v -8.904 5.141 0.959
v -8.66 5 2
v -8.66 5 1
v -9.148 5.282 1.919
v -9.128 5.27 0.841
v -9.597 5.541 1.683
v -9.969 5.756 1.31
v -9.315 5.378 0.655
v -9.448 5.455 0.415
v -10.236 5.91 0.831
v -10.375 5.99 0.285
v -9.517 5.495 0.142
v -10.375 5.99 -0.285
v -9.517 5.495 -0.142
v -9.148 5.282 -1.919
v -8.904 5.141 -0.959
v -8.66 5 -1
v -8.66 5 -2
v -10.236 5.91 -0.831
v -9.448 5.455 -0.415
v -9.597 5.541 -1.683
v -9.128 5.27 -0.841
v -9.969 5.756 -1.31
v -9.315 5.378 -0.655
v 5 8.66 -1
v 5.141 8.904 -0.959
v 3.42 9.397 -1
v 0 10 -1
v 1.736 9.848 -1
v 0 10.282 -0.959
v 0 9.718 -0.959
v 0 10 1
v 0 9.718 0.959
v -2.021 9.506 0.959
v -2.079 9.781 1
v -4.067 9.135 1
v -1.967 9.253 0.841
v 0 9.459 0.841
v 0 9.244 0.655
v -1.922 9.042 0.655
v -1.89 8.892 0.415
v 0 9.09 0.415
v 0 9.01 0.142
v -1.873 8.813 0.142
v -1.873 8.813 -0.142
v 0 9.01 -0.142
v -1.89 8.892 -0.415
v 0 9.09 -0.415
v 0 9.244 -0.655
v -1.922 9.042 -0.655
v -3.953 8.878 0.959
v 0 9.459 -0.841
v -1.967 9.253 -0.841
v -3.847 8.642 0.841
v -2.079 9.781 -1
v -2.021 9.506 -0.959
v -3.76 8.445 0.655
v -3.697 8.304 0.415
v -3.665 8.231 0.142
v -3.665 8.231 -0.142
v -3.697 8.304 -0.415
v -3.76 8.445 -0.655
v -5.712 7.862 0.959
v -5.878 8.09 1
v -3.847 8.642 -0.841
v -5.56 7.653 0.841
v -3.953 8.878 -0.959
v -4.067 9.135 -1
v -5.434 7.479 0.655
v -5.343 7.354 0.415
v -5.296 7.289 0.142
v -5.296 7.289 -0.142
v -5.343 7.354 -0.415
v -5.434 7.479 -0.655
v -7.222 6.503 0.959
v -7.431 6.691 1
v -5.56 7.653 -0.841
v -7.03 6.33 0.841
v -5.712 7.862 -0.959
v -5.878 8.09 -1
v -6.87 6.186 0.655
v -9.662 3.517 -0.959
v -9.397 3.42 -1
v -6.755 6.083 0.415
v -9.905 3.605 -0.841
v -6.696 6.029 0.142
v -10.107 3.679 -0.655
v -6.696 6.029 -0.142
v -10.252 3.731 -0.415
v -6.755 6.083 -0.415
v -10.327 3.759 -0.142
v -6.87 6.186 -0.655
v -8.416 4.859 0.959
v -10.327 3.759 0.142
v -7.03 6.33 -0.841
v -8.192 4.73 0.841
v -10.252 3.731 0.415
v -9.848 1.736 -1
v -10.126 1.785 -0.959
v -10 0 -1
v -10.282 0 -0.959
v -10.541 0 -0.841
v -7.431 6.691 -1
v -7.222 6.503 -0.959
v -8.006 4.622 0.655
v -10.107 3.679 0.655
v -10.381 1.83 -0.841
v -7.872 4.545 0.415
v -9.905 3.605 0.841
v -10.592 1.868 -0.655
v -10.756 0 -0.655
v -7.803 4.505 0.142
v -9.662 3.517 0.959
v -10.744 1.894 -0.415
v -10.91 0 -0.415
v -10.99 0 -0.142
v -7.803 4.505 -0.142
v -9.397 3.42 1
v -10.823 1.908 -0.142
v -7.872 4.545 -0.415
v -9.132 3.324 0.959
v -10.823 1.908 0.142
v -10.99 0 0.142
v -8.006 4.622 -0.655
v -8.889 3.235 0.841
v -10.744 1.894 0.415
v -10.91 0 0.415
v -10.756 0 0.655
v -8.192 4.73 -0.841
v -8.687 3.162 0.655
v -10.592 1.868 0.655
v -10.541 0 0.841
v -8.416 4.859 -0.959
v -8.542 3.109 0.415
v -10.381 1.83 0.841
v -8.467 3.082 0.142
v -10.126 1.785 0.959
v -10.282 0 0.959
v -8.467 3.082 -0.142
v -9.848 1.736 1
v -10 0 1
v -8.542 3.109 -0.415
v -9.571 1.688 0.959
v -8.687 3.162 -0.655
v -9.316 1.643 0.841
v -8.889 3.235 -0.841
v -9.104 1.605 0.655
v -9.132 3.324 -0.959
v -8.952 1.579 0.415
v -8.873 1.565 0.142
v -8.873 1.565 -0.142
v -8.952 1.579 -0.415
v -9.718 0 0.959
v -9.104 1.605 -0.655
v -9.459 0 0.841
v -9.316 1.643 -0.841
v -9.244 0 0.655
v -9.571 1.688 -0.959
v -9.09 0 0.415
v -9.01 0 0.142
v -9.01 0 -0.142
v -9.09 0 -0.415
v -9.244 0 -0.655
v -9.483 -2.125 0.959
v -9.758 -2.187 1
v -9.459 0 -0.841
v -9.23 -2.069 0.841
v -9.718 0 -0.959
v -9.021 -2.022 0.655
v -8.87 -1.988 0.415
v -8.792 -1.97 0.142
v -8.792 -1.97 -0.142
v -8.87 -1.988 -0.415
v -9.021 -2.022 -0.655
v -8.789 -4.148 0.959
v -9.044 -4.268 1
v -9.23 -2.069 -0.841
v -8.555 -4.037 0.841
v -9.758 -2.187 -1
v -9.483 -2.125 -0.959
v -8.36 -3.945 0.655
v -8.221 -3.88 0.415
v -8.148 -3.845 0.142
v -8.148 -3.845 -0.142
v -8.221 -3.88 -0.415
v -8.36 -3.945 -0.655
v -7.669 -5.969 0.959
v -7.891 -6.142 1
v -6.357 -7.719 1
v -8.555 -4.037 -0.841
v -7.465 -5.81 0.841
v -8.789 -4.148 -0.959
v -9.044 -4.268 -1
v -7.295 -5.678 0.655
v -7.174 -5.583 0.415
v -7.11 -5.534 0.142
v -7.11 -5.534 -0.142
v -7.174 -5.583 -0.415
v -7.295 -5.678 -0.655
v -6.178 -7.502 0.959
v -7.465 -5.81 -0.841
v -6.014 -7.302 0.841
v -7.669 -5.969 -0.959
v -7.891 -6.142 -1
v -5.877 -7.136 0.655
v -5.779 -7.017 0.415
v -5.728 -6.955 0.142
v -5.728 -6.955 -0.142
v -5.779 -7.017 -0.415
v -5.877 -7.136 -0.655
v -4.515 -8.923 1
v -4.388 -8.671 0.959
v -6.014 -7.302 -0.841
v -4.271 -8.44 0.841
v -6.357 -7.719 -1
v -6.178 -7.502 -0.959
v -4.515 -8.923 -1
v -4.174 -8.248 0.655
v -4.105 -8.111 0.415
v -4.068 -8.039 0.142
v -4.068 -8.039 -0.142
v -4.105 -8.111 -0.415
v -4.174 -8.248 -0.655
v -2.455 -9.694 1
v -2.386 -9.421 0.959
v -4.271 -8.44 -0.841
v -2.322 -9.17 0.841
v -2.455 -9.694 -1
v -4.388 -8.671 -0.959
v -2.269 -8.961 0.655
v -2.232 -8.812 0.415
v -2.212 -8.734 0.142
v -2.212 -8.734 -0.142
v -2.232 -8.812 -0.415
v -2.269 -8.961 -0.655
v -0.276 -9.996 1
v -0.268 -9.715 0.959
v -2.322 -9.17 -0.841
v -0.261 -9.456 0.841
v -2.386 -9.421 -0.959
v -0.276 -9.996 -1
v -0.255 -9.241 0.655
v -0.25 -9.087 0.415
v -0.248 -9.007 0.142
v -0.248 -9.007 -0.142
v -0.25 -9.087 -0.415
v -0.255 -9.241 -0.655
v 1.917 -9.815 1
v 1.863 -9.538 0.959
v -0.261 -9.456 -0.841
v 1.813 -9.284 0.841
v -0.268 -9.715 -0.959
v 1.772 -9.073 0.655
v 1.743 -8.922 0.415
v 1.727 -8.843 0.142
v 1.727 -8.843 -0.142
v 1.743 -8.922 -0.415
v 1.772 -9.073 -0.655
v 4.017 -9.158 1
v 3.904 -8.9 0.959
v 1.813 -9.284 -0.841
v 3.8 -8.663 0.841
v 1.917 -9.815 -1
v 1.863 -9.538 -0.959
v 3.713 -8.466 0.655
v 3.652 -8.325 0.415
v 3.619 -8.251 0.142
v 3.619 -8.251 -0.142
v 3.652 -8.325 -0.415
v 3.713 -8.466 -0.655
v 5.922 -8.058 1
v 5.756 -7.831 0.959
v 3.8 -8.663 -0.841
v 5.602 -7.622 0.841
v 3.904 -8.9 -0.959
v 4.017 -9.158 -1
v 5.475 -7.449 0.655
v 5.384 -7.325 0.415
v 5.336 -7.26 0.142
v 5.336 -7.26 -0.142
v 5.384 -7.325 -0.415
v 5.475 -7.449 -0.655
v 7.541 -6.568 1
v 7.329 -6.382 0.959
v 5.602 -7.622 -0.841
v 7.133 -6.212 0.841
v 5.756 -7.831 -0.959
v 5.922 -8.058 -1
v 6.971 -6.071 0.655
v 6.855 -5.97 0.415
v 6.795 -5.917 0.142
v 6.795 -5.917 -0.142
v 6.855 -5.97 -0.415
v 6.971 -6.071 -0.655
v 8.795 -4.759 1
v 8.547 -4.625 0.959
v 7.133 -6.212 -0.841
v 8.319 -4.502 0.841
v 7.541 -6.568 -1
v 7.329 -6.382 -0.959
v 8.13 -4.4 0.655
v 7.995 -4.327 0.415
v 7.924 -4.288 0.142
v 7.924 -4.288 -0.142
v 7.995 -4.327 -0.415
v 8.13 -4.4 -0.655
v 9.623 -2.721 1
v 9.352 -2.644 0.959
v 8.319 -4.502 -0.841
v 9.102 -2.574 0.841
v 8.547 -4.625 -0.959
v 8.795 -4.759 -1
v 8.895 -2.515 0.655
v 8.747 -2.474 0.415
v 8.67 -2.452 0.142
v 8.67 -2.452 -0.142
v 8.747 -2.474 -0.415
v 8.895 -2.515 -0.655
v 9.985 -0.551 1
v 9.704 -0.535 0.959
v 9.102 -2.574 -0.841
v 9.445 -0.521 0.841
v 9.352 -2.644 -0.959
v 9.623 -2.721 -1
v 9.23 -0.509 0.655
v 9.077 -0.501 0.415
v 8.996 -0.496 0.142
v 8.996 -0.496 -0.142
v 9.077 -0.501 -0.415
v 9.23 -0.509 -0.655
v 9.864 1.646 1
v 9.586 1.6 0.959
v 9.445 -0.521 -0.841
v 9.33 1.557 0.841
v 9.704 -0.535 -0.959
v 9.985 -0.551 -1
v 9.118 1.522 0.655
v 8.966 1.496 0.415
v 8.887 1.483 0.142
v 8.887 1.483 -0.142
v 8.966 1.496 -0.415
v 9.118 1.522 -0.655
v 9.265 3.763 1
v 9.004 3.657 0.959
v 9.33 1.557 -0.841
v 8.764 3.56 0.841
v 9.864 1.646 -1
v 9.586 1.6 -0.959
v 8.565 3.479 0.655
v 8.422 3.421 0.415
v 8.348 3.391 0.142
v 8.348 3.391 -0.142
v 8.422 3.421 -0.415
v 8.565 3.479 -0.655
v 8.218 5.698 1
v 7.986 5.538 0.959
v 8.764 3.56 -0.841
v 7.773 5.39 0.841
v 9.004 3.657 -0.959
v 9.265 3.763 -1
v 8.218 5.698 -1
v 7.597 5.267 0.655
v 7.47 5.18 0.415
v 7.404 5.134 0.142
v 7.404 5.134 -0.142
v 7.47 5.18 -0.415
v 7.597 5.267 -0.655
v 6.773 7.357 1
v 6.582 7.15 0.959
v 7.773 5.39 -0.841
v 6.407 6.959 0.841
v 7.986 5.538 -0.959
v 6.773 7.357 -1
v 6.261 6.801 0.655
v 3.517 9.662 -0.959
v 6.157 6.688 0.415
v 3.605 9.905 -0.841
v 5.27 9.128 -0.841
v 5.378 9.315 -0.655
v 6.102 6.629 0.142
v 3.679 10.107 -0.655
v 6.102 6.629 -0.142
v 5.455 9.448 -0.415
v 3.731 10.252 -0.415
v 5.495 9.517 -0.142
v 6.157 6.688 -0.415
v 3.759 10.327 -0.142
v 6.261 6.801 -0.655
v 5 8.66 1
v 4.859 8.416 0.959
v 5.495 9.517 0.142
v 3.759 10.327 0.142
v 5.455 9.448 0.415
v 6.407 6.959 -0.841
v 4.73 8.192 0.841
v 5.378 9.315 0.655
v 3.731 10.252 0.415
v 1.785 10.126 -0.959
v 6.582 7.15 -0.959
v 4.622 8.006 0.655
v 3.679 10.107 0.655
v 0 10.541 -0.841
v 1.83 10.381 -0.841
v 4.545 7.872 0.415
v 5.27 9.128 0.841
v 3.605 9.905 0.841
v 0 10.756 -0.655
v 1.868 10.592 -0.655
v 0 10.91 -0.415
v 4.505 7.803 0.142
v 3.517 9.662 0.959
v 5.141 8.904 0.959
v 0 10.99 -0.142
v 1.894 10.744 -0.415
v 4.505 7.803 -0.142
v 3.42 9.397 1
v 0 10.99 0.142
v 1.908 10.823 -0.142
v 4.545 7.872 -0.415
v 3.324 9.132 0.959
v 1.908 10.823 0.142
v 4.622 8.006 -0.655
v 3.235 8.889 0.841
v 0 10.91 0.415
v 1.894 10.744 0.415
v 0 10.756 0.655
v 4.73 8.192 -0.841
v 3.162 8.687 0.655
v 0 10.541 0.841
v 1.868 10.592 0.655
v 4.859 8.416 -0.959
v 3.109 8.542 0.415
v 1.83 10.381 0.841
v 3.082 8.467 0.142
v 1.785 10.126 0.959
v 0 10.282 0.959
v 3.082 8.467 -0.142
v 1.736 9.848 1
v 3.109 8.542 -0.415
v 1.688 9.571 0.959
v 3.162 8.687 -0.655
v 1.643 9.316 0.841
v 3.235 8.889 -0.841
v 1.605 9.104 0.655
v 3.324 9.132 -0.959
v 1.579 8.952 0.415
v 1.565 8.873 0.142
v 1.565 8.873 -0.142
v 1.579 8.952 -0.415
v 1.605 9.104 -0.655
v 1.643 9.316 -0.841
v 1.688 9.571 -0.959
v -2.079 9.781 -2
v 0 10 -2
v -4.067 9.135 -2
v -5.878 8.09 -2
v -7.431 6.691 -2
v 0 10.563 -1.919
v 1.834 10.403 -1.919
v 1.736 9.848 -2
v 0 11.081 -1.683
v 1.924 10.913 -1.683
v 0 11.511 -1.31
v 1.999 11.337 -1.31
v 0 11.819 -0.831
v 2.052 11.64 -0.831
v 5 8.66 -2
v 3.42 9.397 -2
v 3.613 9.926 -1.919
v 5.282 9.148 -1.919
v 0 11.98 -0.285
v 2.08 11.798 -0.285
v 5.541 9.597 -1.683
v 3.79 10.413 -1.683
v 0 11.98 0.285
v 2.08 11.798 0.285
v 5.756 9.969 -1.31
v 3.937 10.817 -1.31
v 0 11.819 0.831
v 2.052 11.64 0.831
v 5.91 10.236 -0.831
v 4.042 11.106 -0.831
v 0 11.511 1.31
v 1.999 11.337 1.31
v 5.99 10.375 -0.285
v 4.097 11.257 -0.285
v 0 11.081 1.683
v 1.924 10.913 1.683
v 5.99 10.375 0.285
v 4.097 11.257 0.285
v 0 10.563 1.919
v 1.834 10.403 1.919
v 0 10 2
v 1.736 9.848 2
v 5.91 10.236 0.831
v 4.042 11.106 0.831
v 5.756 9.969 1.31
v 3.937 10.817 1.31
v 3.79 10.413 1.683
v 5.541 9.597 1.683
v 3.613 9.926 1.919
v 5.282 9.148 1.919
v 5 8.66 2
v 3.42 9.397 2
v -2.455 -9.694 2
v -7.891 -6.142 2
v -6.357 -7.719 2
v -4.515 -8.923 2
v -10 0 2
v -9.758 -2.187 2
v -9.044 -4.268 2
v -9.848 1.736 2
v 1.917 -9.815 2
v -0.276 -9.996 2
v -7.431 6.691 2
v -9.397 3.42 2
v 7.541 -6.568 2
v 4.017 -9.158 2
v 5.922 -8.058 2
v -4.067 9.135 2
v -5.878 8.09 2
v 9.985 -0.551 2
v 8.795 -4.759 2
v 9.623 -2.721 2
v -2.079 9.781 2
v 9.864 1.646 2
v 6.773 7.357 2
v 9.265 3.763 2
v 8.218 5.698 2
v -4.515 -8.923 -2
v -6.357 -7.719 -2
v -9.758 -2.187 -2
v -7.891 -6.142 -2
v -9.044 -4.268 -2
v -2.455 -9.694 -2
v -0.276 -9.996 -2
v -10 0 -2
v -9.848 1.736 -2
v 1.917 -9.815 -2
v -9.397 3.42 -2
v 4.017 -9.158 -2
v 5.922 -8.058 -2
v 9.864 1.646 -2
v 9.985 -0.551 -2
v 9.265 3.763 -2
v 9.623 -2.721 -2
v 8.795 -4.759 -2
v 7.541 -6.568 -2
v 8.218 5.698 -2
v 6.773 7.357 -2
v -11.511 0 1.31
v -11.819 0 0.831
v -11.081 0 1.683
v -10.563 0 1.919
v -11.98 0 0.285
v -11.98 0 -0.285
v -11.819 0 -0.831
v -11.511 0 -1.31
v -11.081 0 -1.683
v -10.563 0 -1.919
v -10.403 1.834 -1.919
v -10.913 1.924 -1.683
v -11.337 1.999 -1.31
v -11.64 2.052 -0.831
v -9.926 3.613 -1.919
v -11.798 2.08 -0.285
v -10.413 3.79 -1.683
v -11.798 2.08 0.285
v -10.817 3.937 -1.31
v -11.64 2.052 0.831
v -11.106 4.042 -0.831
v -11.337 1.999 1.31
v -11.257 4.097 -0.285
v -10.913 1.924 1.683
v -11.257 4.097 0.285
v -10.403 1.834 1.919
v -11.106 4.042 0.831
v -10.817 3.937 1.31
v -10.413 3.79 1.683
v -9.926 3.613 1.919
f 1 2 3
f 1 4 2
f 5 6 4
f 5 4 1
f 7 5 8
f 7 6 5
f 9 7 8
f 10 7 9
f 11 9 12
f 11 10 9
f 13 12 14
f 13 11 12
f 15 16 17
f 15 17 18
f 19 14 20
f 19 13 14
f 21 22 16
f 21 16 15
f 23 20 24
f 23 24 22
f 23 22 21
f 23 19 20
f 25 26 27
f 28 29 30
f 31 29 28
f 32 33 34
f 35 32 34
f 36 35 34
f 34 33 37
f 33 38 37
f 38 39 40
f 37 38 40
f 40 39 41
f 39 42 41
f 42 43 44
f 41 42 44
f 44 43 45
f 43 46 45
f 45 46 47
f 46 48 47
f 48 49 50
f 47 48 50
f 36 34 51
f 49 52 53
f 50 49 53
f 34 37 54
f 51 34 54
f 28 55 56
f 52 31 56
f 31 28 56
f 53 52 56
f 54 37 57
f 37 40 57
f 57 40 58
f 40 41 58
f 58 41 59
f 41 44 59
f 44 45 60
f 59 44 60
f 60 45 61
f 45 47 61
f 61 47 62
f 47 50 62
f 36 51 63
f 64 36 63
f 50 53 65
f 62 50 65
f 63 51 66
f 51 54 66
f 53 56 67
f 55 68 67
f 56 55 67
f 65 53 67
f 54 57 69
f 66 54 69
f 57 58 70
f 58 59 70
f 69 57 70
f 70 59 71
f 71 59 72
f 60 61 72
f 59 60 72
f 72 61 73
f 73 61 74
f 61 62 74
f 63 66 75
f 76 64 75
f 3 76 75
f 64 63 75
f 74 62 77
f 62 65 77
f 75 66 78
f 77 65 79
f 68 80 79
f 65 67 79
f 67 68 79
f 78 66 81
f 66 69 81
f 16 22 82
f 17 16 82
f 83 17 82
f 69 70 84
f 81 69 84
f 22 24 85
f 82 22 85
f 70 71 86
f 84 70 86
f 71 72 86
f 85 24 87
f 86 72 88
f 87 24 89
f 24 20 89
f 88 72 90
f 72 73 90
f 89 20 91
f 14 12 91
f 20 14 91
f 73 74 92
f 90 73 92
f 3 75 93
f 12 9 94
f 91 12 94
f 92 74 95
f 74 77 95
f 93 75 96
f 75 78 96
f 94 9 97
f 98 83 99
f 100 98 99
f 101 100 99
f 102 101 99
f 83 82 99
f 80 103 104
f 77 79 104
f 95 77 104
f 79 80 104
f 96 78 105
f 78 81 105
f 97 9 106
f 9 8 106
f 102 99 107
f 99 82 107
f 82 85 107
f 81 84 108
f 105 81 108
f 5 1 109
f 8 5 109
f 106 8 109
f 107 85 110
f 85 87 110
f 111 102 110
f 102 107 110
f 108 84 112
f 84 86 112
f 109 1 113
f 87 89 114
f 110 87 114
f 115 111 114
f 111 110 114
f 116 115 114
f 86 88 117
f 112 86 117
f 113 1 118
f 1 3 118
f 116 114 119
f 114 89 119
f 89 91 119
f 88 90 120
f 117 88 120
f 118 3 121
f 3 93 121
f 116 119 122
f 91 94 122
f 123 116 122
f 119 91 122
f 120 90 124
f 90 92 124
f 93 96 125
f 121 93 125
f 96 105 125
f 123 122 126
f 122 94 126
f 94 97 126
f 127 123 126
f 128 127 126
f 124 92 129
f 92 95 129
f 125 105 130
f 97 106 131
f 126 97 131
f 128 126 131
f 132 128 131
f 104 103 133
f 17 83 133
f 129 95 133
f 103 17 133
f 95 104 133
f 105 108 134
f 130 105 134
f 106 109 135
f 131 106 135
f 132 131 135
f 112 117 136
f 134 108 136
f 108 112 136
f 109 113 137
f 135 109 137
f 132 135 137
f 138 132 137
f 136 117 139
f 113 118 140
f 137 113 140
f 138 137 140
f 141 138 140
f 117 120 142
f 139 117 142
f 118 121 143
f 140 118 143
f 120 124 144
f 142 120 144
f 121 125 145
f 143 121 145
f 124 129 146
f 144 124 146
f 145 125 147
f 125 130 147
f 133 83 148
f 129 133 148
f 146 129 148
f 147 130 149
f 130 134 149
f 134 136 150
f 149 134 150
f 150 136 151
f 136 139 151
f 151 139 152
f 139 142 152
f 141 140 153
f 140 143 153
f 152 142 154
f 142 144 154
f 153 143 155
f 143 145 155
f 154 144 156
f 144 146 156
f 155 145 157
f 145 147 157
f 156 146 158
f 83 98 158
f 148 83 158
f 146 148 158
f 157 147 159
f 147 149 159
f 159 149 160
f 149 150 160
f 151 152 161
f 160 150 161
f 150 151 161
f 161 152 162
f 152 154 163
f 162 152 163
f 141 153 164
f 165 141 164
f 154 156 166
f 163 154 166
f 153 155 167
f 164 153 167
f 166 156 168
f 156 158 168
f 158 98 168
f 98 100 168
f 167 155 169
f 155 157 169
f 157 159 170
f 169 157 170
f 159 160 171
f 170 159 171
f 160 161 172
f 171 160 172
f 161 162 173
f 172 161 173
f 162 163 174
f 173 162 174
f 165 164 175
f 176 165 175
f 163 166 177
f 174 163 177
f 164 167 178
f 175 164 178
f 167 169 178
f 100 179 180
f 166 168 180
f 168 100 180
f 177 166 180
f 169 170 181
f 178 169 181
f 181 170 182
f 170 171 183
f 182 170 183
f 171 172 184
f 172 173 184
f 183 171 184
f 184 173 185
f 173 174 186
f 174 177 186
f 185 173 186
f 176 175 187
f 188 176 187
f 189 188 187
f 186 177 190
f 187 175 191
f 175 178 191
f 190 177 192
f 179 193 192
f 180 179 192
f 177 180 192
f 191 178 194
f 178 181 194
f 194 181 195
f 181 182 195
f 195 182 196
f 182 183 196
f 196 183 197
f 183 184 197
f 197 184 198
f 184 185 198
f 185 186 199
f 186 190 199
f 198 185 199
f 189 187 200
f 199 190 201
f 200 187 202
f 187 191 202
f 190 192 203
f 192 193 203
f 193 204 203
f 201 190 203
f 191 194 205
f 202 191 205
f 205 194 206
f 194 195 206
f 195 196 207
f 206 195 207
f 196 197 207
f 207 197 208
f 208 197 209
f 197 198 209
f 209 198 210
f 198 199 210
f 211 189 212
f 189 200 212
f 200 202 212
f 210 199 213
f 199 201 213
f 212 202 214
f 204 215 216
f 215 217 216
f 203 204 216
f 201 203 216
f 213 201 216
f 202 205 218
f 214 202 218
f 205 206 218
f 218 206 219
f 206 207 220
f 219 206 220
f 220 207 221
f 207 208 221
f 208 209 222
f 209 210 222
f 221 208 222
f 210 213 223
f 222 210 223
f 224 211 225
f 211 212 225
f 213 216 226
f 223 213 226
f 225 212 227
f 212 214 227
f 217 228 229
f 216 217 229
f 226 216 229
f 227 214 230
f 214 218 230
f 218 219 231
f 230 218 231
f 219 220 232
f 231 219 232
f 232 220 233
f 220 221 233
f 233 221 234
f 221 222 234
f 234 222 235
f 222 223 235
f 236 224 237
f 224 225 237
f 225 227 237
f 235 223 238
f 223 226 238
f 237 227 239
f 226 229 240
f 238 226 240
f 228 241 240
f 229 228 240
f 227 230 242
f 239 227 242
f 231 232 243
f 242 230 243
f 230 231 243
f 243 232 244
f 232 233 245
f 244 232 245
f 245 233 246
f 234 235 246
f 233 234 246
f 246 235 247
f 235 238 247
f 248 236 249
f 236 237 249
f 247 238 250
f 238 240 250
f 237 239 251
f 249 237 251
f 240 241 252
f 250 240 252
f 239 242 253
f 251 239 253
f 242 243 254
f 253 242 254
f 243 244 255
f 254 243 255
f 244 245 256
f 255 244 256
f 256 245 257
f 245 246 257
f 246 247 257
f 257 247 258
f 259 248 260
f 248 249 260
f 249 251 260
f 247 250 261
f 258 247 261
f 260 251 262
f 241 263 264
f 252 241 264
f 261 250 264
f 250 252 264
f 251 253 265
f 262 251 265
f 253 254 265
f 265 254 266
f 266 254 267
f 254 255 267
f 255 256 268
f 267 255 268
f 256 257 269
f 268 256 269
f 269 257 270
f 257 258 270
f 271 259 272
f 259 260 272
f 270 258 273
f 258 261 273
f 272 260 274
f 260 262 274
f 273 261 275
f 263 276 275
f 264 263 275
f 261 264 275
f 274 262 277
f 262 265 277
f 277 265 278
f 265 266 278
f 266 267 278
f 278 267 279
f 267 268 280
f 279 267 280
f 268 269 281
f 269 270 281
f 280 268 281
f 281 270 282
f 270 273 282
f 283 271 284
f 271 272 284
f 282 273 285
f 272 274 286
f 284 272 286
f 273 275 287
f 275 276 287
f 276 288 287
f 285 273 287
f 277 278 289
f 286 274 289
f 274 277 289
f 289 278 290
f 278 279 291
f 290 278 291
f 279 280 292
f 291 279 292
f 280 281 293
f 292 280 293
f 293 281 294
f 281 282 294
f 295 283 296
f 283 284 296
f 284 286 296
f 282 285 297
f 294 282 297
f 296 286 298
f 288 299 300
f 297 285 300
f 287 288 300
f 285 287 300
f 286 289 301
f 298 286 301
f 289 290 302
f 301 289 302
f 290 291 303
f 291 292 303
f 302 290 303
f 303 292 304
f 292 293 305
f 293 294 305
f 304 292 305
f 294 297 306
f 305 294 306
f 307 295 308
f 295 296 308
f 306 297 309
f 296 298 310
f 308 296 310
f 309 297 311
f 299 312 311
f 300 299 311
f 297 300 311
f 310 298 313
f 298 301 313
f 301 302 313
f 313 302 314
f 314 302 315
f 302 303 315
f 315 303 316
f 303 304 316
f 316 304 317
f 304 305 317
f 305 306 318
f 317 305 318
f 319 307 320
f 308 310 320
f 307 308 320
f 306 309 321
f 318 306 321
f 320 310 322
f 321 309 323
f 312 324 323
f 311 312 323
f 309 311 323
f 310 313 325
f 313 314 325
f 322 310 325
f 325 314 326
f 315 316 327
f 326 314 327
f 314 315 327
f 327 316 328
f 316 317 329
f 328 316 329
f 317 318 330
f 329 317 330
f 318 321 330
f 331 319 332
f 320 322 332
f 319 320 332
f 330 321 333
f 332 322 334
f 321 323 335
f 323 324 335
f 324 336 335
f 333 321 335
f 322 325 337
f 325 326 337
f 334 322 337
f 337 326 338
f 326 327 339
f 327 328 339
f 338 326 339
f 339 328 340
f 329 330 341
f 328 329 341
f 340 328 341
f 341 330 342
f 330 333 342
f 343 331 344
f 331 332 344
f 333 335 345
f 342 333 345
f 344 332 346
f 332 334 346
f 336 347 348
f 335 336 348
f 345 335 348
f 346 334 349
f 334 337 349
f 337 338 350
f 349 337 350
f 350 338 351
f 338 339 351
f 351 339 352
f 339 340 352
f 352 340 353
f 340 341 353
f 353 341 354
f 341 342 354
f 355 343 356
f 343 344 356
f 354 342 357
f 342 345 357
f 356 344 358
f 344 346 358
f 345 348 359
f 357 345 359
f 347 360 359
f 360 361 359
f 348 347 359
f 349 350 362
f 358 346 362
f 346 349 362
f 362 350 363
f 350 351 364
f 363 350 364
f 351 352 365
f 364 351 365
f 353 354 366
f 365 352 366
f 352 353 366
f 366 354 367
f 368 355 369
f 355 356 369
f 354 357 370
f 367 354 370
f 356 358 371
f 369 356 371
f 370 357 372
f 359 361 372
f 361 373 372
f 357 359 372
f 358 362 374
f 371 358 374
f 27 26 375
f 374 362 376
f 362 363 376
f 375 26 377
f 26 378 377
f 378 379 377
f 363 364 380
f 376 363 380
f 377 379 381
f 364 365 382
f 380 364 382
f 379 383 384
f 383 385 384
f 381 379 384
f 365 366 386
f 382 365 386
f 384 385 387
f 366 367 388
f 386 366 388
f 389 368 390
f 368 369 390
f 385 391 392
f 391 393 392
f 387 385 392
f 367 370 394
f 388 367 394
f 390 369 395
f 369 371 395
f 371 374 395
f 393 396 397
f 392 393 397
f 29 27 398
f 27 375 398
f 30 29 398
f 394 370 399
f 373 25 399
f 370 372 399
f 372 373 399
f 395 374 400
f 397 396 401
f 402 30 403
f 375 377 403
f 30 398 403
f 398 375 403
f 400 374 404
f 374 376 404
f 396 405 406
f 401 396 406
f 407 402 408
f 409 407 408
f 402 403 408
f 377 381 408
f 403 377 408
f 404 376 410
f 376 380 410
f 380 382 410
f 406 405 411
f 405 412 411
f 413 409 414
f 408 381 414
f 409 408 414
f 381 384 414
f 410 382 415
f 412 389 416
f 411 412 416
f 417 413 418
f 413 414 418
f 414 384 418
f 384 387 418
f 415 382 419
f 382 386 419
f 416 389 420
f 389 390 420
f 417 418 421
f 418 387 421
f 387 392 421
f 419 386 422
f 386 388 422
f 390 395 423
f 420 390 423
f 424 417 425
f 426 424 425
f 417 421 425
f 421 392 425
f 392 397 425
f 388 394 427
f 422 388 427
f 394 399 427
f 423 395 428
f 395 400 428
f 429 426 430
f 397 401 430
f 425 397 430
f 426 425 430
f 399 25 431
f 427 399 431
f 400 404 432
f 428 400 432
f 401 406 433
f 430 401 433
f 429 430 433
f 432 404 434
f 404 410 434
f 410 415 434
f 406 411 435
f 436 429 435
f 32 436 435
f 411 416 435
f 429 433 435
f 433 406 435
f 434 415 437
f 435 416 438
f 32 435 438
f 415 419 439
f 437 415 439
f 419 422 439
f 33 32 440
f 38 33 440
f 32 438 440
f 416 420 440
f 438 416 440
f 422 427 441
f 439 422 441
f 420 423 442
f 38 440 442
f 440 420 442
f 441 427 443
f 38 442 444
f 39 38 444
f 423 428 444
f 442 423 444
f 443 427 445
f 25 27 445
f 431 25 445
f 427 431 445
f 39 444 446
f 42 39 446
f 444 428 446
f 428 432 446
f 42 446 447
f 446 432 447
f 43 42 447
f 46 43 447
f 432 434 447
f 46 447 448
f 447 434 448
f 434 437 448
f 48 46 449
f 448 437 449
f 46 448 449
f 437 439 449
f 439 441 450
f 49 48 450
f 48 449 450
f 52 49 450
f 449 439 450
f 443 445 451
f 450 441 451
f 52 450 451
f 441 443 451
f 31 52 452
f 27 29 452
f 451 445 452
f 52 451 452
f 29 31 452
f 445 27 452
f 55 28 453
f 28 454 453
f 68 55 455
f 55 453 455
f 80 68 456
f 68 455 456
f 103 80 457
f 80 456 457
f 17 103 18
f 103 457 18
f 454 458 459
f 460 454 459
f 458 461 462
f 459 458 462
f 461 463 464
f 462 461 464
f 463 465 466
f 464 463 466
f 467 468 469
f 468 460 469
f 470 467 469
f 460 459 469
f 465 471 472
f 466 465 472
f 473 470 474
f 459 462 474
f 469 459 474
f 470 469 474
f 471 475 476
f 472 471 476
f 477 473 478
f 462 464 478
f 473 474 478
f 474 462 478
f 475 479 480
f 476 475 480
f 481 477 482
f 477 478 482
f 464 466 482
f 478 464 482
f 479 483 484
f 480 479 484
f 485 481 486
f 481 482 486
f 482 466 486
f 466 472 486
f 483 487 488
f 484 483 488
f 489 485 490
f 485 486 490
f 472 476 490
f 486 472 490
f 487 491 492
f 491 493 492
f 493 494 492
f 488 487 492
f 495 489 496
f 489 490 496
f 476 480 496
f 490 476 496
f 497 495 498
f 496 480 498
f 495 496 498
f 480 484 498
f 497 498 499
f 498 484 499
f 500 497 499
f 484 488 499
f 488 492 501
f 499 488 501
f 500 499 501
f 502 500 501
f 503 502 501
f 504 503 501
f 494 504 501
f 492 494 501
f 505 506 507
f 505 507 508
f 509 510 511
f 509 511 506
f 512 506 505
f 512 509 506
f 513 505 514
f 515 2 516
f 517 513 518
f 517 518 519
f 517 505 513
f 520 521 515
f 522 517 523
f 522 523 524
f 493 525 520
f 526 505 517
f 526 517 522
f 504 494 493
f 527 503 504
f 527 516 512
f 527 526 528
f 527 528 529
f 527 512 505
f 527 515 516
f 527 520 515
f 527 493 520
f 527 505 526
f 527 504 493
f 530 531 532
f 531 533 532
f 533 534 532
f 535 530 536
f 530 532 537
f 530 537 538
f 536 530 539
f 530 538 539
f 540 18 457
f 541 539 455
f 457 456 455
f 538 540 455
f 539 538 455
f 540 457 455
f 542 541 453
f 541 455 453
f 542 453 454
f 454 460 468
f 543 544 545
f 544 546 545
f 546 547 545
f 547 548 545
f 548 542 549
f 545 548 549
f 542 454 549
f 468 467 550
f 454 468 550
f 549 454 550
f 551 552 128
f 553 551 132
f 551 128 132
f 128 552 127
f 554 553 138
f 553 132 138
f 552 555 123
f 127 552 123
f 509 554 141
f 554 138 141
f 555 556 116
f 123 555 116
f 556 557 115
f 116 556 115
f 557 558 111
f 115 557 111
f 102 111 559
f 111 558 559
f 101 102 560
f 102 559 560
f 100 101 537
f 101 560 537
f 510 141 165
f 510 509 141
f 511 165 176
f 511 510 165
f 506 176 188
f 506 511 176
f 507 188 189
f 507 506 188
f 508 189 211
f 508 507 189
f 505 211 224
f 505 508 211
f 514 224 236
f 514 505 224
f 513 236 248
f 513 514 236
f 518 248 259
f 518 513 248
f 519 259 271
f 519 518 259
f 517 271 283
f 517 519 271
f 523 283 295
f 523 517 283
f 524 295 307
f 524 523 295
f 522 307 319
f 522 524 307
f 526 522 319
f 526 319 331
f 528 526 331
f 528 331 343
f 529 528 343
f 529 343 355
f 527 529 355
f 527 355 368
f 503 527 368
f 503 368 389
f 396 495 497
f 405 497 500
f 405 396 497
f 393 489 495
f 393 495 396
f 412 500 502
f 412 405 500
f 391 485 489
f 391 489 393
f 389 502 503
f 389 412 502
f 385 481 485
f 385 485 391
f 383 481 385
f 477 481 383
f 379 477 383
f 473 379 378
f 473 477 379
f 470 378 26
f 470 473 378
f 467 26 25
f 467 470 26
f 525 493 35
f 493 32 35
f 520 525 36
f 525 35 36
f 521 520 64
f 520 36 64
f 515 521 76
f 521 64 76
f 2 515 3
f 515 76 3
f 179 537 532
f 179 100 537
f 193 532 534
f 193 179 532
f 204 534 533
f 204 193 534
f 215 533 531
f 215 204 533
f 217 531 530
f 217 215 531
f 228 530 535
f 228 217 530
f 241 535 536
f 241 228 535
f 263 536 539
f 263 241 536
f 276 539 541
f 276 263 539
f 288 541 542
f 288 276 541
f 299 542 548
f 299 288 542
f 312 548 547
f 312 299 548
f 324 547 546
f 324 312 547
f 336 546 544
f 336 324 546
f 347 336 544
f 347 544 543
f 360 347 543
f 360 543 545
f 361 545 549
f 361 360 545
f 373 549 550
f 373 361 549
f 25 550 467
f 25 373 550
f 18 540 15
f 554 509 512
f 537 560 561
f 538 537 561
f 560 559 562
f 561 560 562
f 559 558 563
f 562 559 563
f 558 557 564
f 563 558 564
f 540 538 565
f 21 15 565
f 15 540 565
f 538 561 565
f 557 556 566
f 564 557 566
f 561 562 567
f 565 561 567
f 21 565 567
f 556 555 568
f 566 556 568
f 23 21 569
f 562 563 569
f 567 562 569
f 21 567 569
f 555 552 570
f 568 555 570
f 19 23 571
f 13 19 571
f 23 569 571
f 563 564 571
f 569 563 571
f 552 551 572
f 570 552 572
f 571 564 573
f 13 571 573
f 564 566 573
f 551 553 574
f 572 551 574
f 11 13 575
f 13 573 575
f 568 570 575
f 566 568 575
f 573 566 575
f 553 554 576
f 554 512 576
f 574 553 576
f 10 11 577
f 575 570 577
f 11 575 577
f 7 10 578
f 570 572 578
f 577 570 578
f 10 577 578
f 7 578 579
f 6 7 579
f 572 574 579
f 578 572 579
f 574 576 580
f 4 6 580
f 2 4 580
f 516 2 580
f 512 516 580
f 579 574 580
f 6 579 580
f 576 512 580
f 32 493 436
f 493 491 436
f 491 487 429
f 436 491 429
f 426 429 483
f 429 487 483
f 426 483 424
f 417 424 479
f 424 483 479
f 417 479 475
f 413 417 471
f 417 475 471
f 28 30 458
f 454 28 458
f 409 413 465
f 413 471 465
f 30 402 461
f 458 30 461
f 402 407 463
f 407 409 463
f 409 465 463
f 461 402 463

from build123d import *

# Parameters (mm, degrees)
ESQUISSE1_R                             = 10
BOSS_EXTRU_1_DEPTH                      = 2
ESQUISSE4_R                             = 2
R_VOLUTION1_ANGLE                       = 120
ESQUISSE2_R                             = 1
ENL_VEMENT_DE_MATI_RE_R_VOLUTION2_ANGLE = 60


with BuildPart() as part:
    # Esquisse1 → Boss.-Extru.1 (new body, symmetric)
    with BuildSketch(Plane.XY):
        Circle(ESQUISSE1_R)
    extrude(amount=BOSS_EXTRU_1_DEPTH, both=True)

    # Esquisse4 → Révolution1 (revolve)
    with BuildSketch(Plane(origin=(0, 0, 0), x_dir=(1, 0, 0), z_dir=(0, 1, 0))):
        with Locations((-10, 0)):
            Circle(ESQUISSE4_R)
    revolve(axis=Axis((0, 0, 2), (0, 0, -1)), revolution_arc=R_VOLUTION1_ANGLE)

    # Esquisse2 → Enlèvement de matière-Révolution1 (revolve, cut)
    with BuildSketch(Plane(origin=(0, 0, 0), x_dir=(0, 0, -1), z_dir=(1, 0, 0))):
        with Locations((0, 10)):
            Circle(ESQUISSE2_R)
    revolve(axis=Axis((0, 0, -8.634448203), (0, 0, 1)), mode=Mode.SUBTRACT)

    # Esquisse6 → Enlèvement de matière-Révolution2 (revolve, cut)
    with BuildSketch(Plane(origin=(0, 0, 0), x_dir=(0, 0, -1), z_dir=(1, 0, 0))):
        with BuildLine():
            Line((-2, 10), (-1, 10))
            ThreePointArc((-1, 10), (0, 11), (1, 10))
            Line((1, 10), (2, 10))
            ThreePointArc((2, 10), (0, 12), (-2, 10))
        make_face()
    revolve(axis=Axis((0, 0, 0), (0, 0, 1)), revolution_arc=ENL_VEMENT_DE_MATI_RE_R_VOLUTION2_ANGLE, mode=Mode.SUBTRACT)


solid = part.part
